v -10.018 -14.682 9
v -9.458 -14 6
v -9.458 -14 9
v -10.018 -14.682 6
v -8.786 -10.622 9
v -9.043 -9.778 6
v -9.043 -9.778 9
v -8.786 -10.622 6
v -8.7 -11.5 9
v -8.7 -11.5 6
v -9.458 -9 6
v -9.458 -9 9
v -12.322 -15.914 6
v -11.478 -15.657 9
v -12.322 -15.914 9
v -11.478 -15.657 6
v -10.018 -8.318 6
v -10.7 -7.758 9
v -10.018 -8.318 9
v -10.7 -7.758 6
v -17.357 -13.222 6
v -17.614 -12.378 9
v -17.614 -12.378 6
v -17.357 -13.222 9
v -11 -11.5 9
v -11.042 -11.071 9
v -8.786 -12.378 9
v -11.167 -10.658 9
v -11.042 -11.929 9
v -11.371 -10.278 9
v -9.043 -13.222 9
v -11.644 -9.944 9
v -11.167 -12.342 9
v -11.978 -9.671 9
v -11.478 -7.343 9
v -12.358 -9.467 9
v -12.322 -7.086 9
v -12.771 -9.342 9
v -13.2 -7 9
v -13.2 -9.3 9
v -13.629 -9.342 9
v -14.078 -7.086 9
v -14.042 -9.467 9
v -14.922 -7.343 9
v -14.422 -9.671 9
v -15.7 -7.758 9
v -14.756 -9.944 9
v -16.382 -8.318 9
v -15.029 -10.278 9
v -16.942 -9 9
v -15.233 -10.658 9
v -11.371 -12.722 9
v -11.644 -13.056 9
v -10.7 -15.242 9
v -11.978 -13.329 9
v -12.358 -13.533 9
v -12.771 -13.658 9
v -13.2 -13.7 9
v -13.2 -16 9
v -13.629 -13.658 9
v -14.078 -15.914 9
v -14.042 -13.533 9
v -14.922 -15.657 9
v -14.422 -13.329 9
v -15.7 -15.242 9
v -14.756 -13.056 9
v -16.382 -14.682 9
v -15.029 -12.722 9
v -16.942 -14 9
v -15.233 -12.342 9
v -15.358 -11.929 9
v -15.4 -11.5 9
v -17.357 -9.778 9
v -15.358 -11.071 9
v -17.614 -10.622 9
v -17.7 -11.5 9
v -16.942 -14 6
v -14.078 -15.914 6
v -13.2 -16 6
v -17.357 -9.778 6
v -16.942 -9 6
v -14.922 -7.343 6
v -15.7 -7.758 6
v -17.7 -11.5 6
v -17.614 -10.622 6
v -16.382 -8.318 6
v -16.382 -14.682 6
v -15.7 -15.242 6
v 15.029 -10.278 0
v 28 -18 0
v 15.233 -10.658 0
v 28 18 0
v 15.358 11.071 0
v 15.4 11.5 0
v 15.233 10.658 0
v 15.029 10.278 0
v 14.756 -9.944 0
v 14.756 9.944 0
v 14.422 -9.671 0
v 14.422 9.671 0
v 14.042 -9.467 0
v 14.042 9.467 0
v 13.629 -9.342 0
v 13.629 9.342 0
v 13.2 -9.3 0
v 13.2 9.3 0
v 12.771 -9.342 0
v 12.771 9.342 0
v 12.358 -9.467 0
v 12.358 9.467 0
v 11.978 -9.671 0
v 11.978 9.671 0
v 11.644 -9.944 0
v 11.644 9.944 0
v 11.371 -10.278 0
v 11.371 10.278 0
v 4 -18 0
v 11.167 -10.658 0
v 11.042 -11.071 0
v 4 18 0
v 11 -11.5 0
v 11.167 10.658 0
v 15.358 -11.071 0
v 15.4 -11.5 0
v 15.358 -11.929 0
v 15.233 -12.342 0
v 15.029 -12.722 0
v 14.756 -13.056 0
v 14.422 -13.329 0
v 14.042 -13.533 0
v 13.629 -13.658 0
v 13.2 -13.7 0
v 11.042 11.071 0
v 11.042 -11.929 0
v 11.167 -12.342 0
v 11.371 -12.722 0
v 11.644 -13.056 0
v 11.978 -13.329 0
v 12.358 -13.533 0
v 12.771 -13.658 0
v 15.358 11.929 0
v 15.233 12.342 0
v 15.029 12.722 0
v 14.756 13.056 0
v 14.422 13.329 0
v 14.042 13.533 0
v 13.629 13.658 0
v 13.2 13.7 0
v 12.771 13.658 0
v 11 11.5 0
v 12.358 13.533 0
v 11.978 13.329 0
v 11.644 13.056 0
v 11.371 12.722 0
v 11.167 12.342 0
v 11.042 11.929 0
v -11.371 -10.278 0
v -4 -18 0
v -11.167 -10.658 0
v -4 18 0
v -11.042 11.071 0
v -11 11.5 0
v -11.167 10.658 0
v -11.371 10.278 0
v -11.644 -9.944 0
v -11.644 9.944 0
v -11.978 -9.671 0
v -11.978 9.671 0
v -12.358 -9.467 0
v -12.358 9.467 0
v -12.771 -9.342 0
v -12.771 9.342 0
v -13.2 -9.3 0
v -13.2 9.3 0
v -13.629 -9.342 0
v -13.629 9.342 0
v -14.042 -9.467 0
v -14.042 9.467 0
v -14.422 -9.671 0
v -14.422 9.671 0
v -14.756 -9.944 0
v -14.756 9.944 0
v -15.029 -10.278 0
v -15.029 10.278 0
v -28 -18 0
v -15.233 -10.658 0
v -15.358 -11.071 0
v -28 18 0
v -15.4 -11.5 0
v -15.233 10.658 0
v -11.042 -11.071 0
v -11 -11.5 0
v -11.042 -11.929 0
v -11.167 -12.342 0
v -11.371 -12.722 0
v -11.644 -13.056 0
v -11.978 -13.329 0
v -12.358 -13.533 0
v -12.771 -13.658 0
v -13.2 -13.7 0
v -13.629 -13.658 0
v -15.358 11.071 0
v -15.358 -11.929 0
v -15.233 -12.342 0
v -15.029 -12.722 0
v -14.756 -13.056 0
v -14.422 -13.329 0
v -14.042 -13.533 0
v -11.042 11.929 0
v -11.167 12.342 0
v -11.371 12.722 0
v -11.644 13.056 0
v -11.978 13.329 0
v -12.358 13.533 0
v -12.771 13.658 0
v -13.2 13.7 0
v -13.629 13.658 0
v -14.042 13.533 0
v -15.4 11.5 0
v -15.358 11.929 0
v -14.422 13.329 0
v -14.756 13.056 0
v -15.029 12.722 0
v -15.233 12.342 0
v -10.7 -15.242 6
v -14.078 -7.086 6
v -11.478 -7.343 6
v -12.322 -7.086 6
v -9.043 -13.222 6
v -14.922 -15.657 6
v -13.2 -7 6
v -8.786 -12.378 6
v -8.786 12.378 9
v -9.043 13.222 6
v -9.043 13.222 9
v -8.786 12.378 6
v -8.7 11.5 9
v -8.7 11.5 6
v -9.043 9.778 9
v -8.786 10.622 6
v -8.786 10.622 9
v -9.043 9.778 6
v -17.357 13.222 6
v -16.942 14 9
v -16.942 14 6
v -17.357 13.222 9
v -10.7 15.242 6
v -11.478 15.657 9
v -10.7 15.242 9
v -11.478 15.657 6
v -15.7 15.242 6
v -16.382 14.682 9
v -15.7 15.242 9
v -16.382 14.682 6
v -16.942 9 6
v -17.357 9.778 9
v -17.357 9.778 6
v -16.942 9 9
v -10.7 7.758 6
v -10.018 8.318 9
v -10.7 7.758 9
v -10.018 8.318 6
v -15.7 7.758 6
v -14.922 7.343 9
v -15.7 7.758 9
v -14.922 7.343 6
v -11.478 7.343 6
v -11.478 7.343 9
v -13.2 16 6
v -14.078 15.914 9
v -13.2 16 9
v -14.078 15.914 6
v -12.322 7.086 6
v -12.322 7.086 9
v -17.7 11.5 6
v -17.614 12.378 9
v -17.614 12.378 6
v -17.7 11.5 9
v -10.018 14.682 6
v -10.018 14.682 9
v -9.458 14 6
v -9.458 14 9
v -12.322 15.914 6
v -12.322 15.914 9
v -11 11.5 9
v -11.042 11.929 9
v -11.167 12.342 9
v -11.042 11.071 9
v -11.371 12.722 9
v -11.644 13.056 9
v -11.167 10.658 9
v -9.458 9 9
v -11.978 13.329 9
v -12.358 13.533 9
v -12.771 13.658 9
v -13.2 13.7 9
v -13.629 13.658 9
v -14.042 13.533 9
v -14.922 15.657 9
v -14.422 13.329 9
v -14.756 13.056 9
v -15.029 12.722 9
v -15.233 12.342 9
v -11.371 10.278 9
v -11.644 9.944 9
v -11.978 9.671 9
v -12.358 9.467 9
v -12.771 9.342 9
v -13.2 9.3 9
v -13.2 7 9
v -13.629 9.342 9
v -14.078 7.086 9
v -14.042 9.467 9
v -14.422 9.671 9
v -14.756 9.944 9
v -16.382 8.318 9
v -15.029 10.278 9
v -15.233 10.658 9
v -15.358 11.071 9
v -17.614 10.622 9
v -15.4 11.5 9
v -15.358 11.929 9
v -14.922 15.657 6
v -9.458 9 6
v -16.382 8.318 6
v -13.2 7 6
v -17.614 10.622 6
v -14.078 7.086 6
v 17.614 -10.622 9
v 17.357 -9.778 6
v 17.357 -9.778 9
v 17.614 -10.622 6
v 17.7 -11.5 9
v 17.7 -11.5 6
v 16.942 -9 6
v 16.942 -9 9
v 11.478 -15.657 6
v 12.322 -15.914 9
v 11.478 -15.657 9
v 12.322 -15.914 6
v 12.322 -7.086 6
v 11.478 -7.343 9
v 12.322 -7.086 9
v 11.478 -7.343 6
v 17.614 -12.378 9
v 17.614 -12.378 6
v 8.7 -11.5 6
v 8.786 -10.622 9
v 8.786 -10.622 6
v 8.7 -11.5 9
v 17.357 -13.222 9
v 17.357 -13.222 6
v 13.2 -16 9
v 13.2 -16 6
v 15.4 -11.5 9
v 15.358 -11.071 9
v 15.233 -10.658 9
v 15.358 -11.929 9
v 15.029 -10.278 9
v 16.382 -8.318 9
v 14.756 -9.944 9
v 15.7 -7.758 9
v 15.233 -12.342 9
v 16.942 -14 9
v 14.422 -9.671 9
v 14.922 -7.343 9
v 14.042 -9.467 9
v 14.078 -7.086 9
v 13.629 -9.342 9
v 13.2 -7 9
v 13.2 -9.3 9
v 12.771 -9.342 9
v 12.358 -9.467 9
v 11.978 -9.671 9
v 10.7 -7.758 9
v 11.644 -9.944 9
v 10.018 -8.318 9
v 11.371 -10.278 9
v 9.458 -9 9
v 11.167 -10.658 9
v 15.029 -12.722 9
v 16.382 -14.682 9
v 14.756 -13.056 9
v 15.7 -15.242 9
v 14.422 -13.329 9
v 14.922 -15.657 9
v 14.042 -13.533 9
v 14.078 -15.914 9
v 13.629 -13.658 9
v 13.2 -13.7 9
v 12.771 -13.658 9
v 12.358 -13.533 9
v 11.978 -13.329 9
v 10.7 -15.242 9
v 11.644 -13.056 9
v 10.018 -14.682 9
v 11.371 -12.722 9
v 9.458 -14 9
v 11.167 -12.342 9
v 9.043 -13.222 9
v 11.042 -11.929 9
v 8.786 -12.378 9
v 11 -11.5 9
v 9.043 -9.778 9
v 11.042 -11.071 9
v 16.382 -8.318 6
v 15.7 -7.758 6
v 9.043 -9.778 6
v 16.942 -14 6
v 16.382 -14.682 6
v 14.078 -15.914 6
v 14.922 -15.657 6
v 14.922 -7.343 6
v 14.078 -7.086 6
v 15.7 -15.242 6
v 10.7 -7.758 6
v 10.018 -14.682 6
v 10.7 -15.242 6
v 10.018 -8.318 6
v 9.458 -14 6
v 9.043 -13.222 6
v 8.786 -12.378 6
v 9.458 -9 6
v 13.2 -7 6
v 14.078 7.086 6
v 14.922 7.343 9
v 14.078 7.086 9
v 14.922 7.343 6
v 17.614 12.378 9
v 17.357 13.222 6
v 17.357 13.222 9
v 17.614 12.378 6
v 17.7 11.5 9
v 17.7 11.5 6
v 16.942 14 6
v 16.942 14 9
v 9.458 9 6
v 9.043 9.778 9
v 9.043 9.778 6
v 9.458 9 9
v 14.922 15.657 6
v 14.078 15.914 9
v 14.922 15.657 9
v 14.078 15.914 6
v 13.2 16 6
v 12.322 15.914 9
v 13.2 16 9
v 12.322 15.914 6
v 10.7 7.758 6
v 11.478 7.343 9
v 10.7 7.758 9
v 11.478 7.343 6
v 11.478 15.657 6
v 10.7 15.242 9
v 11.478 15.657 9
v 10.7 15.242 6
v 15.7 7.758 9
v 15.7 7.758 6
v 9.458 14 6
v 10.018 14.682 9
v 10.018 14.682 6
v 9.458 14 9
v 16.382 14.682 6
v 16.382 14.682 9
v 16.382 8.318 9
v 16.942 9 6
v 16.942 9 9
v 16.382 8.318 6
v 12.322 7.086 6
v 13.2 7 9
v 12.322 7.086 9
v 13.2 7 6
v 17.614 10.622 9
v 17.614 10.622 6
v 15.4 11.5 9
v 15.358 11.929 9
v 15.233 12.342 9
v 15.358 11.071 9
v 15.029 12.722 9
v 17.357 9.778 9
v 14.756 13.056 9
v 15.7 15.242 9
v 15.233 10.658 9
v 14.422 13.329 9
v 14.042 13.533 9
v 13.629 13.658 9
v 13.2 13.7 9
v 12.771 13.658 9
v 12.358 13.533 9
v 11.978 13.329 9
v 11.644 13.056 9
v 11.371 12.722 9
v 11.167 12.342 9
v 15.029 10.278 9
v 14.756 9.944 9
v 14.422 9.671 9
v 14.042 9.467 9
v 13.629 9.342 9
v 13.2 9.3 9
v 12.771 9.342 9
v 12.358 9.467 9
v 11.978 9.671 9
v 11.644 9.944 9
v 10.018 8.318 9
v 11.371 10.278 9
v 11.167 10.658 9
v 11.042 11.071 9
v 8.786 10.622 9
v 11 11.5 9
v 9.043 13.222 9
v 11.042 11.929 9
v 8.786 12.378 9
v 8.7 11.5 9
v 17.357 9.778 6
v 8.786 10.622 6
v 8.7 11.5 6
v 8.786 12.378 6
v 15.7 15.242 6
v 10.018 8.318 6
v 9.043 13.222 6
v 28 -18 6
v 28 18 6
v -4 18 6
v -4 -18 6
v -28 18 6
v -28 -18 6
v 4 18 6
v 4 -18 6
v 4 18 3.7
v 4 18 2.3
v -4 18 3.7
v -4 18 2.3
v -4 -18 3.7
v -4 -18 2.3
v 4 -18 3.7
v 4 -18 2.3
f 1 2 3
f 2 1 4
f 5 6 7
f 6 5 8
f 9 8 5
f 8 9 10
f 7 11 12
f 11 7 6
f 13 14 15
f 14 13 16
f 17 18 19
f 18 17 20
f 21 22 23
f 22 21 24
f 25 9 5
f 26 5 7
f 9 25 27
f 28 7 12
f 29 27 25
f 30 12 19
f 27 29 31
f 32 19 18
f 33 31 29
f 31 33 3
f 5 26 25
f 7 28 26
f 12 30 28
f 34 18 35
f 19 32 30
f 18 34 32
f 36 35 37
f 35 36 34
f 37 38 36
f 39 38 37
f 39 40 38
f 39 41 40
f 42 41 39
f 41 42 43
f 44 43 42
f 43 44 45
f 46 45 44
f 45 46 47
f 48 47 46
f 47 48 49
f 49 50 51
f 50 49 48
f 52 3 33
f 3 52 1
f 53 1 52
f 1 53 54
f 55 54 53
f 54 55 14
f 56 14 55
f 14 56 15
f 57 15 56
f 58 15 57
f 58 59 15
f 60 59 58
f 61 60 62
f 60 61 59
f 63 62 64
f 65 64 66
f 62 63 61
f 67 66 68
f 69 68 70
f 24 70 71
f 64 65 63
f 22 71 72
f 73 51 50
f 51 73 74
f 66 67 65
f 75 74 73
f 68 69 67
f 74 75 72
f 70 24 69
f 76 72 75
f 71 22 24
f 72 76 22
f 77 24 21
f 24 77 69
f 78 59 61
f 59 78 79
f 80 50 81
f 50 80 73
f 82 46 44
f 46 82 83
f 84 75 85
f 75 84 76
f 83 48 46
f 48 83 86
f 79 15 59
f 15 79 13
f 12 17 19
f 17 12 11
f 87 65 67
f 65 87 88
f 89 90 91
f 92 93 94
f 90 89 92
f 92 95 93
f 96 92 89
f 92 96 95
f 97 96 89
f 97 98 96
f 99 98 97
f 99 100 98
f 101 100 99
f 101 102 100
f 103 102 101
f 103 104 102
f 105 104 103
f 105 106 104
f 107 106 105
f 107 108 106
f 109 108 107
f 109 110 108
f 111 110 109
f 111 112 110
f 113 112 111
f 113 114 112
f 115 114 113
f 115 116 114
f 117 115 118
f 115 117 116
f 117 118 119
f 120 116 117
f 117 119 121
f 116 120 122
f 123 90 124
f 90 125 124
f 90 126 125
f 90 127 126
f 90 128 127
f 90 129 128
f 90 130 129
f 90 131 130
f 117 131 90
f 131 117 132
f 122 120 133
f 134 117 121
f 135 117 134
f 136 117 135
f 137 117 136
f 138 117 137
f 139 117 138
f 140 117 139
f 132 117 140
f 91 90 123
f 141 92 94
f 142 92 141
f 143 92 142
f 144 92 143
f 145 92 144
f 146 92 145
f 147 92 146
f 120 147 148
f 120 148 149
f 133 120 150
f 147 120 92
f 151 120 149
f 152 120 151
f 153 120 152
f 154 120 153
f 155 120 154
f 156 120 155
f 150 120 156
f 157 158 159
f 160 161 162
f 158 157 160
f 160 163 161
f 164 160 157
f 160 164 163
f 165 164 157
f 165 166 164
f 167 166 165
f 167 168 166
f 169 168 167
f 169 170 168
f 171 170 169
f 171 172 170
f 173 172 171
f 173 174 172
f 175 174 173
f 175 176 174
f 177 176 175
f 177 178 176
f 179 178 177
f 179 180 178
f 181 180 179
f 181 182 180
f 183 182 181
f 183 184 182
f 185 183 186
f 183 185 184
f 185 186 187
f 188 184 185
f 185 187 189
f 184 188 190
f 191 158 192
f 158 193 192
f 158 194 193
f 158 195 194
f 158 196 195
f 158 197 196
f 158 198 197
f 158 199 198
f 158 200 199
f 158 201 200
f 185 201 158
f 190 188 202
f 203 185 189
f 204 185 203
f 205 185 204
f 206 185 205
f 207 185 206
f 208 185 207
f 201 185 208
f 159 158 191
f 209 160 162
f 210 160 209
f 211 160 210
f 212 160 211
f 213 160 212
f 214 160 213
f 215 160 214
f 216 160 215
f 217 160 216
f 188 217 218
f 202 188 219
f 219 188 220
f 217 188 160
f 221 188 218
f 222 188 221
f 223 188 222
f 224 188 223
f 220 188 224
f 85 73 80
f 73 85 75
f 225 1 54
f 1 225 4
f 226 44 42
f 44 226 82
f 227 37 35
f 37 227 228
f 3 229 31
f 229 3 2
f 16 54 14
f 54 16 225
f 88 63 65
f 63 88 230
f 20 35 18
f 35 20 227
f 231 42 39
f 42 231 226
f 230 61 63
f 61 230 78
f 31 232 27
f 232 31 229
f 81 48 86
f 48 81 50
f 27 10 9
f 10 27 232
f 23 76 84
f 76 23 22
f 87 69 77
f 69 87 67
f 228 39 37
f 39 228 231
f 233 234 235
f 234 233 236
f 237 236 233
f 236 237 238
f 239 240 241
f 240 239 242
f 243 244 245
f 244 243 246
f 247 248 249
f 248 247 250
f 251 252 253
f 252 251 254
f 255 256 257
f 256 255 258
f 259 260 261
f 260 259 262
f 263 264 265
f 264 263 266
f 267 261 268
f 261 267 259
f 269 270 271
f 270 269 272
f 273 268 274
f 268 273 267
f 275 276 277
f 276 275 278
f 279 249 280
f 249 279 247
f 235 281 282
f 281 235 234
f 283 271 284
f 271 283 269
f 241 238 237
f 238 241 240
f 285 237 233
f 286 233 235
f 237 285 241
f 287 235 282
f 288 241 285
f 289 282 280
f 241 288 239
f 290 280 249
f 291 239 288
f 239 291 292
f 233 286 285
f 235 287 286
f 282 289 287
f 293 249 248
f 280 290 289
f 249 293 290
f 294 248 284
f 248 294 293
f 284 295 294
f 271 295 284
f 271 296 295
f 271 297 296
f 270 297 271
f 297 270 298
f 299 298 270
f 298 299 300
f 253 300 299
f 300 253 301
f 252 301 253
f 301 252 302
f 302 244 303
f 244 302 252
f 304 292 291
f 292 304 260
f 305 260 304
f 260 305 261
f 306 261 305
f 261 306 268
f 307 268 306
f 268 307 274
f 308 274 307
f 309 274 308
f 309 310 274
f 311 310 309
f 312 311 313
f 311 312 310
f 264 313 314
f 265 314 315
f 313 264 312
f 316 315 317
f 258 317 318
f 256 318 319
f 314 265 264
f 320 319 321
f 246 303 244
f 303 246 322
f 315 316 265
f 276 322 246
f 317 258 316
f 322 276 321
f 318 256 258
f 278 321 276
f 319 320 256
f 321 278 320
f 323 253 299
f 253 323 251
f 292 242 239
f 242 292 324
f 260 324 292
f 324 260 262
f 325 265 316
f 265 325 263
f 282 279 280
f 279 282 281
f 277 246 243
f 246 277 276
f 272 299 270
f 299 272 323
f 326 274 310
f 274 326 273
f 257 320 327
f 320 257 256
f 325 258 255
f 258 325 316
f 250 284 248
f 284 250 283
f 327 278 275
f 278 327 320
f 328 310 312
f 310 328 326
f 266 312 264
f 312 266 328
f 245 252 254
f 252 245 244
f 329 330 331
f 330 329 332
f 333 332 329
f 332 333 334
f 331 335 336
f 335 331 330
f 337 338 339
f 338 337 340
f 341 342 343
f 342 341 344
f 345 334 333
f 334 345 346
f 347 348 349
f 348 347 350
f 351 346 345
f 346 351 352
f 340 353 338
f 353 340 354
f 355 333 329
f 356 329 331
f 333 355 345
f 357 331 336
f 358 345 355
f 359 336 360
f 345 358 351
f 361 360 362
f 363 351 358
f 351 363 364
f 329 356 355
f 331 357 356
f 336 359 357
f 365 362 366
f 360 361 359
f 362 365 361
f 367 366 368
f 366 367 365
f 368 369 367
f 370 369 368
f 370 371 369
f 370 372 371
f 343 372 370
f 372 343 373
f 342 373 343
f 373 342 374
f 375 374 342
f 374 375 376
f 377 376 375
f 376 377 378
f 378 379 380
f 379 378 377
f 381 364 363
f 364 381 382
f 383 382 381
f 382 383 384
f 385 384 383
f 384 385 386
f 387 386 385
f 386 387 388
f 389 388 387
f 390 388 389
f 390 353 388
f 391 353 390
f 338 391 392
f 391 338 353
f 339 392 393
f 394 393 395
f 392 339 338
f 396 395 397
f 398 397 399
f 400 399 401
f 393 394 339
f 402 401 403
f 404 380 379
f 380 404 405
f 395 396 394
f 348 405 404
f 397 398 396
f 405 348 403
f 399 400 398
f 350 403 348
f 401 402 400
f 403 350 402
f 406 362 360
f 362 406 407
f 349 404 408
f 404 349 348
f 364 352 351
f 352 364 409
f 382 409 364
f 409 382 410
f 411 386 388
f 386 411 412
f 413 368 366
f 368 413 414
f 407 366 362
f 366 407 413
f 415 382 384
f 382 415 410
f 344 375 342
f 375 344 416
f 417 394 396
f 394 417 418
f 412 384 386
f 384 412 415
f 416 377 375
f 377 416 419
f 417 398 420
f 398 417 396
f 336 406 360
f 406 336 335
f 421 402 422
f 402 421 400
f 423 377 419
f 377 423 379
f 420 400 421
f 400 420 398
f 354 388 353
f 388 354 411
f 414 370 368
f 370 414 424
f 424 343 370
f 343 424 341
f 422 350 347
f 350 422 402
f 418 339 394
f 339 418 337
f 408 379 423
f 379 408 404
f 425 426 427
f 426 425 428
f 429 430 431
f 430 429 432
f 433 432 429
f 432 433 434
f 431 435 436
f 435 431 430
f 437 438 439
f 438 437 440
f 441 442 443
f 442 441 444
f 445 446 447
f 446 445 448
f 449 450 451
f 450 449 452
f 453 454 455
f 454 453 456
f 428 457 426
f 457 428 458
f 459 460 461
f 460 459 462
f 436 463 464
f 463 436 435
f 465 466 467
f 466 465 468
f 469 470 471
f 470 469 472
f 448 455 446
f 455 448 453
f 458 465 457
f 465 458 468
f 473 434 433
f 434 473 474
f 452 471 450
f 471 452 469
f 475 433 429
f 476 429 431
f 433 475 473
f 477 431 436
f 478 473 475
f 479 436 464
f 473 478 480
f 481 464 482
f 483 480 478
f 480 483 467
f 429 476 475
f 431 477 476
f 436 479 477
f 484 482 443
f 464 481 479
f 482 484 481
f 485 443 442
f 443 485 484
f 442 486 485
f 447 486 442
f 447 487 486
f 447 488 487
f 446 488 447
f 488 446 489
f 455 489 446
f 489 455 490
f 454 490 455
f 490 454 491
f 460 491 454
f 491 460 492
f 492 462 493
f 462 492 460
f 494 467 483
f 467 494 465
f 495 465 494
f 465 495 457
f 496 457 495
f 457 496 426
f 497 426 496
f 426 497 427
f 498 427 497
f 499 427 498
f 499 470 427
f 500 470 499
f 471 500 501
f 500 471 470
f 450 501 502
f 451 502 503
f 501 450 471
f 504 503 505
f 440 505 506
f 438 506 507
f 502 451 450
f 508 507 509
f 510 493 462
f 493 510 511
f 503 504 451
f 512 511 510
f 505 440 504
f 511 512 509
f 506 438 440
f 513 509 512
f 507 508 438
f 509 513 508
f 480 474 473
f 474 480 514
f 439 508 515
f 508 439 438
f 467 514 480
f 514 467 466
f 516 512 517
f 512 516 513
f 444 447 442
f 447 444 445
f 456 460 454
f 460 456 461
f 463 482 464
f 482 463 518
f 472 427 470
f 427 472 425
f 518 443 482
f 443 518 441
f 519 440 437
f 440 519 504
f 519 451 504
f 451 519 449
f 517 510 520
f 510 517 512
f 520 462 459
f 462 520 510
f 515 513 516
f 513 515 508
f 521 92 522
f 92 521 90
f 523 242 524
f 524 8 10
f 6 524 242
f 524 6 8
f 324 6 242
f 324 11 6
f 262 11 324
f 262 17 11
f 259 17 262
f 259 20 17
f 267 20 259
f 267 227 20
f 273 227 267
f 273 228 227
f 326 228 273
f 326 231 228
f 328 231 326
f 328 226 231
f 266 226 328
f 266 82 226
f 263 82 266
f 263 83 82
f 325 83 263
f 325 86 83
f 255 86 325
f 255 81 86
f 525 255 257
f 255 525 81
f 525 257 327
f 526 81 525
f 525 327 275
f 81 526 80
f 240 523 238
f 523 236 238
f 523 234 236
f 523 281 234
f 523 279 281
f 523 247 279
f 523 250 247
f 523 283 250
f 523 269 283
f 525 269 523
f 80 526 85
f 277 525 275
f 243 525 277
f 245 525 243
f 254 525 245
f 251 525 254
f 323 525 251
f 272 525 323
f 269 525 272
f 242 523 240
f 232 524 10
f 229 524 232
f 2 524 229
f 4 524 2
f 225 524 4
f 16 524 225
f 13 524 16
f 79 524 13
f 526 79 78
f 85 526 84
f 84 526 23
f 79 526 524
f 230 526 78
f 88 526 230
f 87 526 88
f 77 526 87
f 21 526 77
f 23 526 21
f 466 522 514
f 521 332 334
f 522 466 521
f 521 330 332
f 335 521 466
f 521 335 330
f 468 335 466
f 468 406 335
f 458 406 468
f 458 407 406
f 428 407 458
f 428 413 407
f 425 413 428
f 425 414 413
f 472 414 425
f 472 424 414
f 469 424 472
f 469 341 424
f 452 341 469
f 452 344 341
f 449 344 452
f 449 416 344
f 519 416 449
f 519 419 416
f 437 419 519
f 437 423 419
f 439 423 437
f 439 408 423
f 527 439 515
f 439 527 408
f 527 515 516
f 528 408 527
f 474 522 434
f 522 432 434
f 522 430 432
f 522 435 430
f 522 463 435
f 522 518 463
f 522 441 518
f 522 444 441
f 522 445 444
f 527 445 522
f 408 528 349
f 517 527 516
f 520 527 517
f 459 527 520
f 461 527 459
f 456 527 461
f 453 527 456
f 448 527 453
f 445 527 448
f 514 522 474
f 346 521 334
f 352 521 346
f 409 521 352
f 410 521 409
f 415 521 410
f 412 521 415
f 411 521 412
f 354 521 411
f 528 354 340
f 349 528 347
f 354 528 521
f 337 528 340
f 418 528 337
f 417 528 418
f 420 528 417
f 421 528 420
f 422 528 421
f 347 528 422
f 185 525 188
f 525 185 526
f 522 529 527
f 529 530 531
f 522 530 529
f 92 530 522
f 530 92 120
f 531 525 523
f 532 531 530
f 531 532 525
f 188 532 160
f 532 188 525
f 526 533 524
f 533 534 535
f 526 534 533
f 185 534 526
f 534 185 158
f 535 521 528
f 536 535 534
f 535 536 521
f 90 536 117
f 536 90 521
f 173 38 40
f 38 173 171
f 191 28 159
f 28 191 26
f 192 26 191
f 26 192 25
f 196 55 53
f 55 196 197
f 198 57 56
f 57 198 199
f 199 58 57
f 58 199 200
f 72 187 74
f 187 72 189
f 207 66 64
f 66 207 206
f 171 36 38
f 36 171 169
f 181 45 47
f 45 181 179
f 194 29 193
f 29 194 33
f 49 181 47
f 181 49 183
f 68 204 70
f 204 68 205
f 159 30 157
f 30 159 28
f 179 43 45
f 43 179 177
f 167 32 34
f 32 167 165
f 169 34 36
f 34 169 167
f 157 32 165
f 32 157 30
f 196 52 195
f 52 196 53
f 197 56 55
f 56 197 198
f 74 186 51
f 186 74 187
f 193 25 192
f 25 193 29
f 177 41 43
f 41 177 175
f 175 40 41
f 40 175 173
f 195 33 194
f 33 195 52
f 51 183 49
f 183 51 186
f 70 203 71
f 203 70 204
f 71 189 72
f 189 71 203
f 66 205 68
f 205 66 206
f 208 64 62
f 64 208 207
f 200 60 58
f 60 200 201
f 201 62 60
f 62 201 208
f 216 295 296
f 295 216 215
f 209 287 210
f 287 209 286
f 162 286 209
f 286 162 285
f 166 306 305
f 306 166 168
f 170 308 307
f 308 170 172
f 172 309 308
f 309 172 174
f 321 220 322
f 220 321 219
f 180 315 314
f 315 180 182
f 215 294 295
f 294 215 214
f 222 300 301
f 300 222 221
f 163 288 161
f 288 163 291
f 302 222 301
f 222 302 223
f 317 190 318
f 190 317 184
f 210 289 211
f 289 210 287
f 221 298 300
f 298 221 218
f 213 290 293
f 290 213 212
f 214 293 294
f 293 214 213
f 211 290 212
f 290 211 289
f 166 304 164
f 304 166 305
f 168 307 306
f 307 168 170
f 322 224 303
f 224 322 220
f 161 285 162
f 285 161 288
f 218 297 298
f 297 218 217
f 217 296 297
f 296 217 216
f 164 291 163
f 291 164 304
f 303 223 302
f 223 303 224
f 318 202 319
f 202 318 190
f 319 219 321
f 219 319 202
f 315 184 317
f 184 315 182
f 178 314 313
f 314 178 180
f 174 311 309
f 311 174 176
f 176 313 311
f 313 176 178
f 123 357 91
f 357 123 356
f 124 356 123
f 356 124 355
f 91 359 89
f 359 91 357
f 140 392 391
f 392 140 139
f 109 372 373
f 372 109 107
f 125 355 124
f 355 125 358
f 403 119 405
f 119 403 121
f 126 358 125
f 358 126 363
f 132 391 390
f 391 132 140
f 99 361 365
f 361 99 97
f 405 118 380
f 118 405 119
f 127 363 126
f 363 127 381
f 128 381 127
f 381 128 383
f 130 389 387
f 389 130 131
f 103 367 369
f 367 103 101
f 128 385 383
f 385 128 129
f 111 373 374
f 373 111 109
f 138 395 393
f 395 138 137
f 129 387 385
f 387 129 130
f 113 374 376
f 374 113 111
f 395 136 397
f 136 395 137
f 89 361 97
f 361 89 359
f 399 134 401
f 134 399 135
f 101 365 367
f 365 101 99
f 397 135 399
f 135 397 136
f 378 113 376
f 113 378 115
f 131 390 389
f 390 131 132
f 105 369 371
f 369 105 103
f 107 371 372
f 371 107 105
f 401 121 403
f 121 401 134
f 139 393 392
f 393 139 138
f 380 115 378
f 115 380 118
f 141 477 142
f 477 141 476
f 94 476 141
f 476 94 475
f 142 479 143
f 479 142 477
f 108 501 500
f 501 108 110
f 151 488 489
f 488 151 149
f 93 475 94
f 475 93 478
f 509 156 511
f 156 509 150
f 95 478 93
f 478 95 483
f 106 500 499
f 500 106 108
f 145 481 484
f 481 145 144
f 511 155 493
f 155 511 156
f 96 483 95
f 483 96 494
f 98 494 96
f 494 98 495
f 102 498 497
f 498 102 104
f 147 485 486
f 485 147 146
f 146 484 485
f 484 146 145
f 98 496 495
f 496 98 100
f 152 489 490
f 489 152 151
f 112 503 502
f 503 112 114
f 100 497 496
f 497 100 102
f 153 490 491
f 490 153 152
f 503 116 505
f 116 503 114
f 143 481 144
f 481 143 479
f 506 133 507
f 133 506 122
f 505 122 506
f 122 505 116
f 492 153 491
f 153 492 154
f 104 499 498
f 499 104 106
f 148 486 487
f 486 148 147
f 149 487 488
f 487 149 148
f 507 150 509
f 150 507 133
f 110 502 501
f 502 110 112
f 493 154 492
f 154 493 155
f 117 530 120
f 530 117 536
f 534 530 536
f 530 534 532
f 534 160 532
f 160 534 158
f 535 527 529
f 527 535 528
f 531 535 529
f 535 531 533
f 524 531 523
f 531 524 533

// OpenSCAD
$fn = 32;

// ----------------------------------------------------------------------
// Living hinge: 56 x 36 mm plates, 1.4 mm flexible web
// ----------------------------------------------------------------------

// --- parameters (mm) ---
plate_len = 24;           // plate length outside the web
plate_w = 36;             // plate width
thick = 6;                // plate thickness
web_half = 4;             // half width of the flex band
web_t = 1.4;              // flexible web thickness
web_z = 2.3;              // web position inside the thickness
boss_d = 9;               // screw boss diameter
boss_h = 9;               // screw boss height
boss_x = 13.2;            // screw boss distance from the web
screw_d = 4.4;            // screw hole

difference() {
  union() {
    /* one flat strip, later thinned at the middle */
    translate([-28, -18, 0]) cube([56, 36, 6]);
    /* screw bosses, sunk 0.5 mm into the plates */
    for (sx = [-13.2, 13.2]) {
      for (sy = [-11.5, 11.5]) {
        translate([sx, sy, 0]) cylinder(h = boss_h, d = boss_d);
      }
    }
  }
  /* channel from below: leaves the web on top of it */
  translate([-4, -20.5, -2.5]) cube([8, 41, 4.8]);
  /* channel from above: thins the web down to web_t */
  translate([-4, -20.5, 3.7]) cube([8, 41, 4.8]);
  /* screw holes through the bosses */
  for (sx = [-13.2, 13.2]) {
    for (sy = [-11.5, 11.5]) {
      translate([sx, sy, -2.5]) cylinder(h = boss_h + 5, d = screw_d);
    }
  }
}
